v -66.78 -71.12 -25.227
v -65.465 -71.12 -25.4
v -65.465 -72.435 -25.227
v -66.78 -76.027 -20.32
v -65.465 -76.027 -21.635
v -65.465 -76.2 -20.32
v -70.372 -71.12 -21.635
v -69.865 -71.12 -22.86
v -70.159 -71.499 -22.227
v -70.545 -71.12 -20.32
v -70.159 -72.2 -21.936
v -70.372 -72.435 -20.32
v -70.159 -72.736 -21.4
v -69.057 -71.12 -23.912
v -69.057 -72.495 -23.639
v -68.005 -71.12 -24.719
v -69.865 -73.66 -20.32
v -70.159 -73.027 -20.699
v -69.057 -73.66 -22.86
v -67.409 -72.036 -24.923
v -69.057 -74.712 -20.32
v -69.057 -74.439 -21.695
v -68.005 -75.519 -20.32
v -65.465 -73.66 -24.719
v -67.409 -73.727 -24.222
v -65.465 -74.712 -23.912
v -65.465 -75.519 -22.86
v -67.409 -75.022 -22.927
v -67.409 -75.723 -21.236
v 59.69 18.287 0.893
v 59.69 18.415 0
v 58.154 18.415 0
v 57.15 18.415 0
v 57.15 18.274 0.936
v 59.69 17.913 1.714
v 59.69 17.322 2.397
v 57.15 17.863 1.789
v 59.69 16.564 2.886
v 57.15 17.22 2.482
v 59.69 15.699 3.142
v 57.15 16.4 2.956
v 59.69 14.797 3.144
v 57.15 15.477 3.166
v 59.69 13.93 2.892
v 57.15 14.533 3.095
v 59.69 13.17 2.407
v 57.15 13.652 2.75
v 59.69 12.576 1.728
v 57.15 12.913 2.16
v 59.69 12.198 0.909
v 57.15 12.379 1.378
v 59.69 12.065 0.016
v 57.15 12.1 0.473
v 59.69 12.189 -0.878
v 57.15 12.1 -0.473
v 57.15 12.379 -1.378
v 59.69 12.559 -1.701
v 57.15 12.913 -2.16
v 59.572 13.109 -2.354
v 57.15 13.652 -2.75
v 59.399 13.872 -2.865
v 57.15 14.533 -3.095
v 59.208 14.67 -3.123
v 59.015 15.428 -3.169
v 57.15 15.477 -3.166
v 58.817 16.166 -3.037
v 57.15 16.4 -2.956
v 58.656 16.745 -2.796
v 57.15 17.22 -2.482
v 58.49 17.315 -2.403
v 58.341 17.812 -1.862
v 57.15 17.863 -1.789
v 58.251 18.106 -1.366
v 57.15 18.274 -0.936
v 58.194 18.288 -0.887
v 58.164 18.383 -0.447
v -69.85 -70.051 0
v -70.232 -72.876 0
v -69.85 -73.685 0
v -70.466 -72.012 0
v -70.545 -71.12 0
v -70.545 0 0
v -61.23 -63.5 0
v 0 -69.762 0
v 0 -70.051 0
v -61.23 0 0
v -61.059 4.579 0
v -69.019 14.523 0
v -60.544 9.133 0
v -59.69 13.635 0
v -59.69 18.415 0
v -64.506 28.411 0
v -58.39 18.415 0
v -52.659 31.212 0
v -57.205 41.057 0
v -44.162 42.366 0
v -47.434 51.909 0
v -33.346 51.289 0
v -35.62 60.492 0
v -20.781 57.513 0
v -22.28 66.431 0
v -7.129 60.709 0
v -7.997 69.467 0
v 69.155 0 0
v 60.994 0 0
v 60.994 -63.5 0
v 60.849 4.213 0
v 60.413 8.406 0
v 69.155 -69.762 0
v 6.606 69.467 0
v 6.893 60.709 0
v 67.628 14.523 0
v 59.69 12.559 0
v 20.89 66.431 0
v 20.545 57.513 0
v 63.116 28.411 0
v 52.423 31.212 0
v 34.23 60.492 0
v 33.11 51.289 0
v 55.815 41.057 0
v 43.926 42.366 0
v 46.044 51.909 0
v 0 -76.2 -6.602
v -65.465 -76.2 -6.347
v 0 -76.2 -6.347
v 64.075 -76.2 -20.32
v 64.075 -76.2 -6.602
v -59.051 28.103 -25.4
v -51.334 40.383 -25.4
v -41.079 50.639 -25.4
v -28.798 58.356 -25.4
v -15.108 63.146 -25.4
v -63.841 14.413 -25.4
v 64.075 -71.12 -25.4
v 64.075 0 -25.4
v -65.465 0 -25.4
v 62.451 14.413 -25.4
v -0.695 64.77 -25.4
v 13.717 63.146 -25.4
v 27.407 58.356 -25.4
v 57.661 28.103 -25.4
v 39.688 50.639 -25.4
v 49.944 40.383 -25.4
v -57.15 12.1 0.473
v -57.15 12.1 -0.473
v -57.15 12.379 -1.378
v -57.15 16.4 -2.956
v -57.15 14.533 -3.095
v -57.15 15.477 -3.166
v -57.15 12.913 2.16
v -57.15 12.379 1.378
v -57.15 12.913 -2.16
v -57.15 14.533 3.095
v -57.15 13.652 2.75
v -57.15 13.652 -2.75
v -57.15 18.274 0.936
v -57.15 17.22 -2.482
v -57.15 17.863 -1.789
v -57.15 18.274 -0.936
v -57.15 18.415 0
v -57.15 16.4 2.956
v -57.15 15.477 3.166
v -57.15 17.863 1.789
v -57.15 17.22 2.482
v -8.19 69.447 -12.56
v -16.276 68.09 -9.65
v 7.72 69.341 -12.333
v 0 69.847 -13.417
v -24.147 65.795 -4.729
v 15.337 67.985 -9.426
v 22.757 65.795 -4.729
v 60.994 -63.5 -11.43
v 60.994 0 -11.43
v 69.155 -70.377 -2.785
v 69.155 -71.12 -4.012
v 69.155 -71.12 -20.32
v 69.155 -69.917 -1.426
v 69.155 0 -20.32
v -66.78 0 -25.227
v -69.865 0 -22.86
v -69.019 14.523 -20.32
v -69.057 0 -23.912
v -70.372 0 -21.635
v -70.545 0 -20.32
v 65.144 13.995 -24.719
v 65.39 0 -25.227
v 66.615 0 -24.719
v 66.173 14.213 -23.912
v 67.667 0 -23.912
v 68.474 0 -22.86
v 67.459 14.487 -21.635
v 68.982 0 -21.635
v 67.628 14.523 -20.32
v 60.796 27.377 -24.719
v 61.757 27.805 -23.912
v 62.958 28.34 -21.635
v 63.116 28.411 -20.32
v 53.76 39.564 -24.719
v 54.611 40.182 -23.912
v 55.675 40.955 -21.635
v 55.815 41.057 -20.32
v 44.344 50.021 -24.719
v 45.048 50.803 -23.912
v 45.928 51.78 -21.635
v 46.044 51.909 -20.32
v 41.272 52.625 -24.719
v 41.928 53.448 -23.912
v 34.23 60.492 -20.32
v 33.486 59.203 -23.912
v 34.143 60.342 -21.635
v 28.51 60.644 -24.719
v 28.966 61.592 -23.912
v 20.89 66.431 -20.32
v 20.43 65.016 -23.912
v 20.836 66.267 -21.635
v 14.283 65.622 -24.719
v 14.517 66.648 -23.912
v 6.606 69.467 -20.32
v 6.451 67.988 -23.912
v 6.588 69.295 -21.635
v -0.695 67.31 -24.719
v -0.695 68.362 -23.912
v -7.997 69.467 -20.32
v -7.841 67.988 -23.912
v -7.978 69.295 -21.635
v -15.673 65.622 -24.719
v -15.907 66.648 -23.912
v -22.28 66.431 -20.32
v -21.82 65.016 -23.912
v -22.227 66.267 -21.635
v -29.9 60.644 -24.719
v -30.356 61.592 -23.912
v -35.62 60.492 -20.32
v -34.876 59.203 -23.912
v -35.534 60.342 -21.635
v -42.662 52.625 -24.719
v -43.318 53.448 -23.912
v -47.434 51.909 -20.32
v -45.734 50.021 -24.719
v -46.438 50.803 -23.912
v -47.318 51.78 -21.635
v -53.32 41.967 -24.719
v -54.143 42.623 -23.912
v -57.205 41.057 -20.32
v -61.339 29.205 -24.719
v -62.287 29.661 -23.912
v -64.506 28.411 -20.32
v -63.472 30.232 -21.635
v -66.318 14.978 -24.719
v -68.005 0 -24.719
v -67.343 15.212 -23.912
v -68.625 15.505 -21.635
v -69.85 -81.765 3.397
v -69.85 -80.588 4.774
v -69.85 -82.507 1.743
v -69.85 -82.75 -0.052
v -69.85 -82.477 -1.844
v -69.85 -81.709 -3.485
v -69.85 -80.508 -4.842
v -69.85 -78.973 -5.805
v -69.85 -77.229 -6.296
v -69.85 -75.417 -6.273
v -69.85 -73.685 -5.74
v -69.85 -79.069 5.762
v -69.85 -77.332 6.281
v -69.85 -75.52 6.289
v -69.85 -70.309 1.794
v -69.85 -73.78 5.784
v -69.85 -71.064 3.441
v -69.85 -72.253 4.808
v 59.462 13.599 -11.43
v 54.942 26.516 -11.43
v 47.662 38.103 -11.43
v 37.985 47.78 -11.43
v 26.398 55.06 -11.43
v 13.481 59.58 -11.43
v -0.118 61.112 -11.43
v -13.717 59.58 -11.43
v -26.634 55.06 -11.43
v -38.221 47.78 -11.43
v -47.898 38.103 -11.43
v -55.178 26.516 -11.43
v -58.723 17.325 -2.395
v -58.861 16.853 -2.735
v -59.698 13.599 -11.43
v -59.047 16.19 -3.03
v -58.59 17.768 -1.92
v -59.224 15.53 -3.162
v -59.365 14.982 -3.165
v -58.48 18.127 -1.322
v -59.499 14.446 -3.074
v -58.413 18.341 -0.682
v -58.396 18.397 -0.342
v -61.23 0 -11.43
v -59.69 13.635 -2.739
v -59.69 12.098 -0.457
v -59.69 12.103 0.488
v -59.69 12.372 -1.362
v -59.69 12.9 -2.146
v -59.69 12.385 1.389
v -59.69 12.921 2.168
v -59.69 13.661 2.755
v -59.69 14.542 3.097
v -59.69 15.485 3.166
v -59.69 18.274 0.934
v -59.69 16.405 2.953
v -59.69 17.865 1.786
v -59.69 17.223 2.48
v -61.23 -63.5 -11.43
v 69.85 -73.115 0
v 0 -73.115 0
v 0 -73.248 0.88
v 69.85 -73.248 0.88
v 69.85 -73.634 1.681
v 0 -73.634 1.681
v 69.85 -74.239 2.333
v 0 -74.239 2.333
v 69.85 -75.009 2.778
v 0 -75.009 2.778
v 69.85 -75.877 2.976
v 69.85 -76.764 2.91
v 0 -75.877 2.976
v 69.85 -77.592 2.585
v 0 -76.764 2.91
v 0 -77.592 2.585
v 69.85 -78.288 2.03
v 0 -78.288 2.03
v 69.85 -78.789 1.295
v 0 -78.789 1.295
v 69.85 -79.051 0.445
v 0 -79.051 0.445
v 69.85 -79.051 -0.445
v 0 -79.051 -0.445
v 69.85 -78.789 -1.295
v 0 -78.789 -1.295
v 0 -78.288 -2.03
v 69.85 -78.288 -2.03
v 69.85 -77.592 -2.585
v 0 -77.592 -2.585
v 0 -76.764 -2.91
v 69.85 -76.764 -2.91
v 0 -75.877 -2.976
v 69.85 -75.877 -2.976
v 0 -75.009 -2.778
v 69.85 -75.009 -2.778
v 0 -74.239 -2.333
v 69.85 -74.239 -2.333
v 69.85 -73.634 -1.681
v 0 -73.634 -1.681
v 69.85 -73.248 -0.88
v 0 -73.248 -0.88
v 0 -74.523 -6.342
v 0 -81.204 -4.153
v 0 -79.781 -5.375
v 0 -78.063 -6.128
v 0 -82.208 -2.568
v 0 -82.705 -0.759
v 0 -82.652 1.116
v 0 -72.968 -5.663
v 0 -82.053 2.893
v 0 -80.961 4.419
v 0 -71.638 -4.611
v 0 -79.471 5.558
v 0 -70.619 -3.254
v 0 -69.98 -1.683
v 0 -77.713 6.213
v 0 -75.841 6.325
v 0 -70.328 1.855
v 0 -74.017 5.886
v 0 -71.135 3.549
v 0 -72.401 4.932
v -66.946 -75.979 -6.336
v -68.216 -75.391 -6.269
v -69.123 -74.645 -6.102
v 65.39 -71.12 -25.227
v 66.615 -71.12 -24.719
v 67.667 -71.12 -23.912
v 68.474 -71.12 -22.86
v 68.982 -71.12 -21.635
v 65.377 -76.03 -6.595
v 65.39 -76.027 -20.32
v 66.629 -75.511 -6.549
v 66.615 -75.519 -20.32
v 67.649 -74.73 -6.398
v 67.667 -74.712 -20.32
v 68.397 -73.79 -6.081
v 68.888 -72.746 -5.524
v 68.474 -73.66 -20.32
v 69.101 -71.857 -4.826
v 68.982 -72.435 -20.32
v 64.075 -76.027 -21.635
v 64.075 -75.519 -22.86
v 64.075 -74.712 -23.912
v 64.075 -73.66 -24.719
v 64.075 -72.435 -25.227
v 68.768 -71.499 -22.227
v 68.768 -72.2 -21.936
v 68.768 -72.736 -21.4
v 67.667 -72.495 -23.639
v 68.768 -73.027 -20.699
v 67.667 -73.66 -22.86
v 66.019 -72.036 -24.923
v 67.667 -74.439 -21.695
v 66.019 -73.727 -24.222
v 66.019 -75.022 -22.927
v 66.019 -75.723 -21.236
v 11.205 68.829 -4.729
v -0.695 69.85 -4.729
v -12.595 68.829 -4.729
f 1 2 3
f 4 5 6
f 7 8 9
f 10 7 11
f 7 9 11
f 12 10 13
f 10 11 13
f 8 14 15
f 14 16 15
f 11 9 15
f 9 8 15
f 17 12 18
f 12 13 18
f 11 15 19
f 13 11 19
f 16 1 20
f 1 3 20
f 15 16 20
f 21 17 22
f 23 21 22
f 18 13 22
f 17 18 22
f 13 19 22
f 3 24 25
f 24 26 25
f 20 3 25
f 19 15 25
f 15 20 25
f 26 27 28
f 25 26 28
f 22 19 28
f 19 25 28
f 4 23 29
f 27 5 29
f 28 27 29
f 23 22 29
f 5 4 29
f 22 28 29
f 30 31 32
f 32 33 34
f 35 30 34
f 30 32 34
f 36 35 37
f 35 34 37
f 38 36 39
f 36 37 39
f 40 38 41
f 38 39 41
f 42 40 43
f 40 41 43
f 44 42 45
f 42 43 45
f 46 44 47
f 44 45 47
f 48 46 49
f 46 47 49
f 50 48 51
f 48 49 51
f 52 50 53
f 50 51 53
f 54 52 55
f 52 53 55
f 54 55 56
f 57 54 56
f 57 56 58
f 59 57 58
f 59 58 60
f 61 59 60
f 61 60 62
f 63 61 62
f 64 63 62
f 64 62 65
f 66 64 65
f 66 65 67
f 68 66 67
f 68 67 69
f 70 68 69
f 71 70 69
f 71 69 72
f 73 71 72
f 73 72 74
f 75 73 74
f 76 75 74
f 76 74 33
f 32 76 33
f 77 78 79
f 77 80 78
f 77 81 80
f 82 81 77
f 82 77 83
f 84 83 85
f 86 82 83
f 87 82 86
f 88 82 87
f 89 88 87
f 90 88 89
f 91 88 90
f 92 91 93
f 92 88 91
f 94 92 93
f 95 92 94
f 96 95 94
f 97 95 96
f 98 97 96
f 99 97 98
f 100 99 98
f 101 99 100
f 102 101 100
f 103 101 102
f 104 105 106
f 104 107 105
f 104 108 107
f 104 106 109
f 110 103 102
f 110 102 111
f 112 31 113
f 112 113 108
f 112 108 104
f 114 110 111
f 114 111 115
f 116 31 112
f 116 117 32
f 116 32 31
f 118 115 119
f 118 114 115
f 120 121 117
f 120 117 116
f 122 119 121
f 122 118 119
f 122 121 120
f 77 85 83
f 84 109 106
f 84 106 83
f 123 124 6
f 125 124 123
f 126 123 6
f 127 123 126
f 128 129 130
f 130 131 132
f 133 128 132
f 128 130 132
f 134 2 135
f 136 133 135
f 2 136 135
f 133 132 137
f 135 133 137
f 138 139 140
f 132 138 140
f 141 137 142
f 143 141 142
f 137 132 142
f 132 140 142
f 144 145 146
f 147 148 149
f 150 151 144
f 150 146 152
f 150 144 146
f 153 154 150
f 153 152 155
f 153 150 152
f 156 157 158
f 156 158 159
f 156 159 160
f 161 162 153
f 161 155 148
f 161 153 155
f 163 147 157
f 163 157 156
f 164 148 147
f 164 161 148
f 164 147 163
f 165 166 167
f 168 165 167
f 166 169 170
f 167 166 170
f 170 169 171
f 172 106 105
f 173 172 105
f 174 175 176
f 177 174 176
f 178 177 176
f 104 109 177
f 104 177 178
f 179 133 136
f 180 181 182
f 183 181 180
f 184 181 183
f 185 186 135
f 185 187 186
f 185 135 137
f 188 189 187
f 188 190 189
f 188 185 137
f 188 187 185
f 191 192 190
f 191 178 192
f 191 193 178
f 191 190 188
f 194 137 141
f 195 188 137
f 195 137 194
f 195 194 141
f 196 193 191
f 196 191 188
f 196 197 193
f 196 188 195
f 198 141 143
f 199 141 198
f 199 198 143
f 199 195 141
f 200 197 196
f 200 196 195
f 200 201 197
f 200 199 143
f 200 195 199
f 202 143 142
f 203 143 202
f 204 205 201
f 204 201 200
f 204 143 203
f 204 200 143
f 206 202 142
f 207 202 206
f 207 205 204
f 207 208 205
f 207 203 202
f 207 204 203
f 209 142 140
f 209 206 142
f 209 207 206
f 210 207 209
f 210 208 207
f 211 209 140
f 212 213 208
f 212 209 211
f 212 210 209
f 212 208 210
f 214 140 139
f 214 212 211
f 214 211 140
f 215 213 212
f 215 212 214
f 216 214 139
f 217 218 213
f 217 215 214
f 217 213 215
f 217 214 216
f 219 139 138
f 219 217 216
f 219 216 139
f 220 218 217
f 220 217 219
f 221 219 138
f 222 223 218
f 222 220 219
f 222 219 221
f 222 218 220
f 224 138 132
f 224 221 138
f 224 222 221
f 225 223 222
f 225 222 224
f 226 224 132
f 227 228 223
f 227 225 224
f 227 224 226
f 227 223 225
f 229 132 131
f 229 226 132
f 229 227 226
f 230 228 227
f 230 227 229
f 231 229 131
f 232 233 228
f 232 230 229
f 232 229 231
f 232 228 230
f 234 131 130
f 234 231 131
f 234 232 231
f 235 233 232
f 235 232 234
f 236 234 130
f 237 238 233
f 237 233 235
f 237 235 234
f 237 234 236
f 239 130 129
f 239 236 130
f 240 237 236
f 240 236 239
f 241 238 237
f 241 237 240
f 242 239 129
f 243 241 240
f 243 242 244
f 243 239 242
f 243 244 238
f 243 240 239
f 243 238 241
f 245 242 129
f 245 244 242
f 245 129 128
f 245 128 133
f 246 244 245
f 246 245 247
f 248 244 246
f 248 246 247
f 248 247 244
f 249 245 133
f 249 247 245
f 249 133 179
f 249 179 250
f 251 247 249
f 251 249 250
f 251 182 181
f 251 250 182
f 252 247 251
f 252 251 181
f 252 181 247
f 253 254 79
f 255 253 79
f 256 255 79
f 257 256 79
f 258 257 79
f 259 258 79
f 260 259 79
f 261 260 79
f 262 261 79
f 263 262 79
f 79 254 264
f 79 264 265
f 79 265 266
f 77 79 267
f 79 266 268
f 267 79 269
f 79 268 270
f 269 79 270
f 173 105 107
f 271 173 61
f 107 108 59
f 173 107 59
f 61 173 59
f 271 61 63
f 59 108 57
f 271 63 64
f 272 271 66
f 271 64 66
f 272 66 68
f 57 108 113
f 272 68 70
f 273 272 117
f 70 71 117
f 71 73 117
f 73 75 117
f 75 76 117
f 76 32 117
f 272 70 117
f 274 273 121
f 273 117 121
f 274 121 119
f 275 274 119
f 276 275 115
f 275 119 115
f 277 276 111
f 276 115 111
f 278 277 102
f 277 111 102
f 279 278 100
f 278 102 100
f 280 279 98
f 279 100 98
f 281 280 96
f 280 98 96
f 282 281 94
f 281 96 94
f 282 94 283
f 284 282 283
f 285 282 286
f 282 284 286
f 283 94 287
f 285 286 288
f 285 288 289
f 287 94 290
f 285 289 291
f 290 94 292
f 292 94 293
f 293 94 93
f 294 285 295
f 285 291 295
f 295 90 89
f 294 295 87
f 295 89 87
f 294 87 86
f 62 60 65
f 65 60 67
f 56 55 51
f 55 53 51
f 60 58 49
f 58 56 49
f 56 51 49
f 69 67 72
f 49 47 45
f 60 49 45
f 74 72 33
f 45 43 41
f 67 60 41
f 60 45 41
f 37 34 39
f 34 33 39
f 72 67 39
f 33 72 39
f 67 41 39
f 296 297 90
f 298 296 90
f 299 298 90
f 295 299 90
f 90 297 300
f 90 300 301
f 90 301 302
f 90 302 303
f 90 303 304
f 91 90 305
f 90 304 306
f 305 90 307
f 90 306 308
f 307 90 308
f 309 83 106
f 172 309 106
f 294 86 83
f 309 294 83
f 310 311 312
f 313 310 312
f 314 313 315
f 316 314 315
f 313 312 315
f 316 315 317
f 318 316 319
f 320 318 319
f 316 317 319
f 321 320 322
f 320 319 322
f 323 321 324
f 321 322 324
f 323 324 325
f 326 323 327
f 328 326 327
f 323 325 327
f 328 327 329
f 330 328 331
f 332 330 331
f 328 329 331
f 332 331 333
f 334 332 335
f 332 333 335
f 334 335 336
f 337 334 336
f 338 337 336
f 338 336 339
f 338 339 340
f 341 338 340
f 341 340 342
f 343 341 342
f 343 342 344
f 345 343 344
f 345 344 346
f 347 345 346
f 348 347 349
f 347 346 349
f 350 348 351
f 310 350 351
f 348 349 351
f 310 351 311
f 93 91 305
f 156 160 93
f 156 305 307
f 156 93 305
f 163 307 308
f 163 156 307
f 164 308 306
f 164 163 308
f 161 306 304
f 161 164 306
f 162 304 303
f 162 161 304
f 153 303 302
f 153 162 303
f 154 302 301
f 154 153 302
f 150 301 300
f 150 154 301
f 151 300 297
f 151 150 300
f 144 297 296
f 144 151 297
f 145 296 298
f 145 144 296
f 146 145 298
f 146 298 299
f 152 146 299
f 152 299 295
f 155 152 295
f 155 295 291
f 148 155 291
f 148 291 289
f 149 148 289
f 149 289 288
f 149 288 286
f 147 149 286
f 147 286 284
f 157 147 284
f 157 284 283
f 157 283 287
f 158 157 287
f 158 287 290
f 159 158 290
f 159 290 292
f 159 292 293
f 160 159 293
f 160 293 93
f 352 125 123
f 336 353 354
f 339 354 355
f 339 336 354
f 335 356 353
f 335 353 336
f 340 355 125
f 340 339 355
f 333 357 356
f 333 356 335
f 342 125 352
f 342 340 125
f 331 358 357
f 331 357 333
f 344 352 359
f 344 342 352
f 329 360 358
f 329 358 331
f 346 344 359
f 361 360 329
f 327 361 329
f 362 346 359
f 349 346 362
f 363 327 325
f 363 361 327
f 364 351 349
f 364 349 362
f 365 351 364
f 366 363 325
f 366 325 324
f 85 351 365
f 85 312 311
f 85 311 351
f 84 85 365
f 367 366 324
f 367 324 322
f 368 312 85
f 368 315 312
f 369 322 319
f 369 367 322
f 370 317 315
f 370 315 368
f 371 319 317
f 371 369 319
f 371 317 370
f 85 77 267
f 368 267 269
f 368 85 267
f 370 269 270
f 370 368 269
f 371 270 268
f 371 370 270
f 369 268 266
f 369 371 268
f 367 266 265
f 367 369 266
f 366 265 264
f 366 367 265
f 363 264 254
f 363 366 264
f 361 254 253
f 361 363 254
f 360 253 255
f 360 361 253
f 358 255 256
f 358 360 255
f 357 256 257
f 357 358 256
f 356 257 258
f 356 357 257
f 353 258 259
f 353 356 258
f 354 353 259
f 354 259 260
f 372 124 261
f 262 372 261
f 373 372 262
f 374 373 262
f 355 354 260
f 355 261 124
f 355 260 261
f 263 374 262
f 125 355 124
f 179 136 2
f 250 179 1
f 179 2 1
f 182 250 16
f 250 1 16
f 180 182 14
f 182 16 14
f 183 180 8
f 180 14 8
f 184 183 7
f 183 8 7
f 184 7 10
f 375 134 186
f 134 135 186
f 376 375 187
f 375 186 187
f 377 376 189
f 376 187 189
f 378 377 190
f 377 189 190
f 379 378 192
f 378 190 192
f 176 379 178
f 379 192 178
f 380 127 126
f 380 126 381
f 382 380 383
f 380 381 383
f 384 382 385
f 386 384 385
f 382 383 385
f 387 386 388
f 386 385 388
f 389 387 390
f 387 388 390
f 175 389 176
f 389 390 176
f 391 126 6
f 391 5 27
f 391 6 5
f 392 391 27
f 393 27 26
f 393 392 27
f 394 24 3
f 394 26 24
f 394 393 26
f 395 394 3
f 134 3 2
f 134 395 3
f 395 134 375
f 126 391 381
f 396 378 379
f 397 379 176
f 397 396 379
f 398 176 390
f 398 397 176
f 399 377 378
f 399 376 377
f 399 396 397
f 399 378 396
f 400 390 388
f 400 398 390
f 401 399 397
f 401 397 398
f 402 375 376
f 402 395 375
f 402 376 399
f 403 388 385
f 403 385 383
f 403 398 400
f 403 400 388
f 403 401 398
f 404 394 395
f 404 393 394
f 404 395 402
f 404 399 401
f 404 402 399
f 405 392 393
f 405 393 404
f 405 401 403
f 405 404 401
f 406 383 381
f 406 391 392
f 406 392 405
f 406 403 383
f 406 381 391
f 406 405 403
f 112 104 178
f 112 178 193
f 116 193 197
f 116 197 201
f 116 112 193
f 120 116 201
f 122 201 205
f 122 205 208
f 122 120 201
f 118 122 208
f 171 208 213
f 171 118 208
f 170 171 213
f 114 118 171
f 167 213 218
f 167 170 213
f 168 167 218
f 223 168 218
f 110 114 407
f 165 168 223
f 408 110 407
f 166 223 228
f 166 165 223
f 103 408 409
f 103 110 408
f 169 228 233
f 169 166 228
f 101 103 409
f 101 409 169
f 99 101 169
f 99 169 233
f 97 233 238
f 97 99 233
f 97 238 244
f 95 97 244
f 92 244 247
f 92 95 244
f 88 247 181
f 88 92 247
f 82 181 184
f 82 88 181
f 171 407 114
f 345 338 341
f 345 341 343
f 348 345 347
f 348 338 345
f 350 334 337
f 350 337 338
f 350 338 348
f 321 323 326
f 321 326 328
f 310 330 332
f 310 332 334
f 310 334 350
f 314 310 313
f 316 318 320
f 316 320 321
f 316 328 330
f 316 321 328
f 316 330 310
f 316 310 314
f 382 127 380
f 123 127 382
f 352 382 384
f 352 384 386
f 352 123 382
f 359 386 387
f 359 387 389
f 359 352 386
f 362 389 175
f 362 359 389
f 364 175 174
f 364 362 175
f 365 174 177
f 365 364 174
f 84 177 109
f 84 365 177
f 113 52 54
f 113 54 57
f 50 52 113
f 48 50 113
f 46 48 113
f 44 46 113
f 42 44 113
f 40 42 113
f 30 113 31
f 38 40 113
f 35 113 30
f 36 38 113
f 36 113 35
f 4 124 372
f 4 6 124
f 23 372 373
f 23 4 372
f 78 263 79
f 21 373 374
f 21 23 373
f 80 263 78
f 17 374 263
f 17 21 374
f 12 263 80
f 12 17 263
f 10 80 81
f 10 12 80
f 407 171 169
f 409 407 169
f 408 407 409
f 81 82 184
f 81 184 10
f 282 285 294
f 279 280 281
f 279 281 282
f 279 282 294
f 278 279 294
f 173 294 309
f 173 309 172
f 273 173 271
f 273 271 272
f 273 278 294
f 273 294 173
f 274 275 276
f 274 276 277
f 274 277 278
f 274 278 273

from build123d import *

# Parameters (mm, degrees)
F4_DEPTH       = 25.4
F1_R           = 6.35
F5_DEPTH       = 69.85
F3_R           = 6.604
F6_DEPTH       = 69.85
F7_R           = 5.07999
F2_R           = 2.9845
F8_DEPTH       = 69.85
F10_DEPTH      = 11.43
F12_DEPTH      = 25.4
F12_DEPTH_BACK = 25.4
F13_R          = 3.175
F14_DEPTH      = 59.69
F14_DEPTH_BACK = 59.69
F15_R          = 3.1877
F16_DEPTH      = 57.15
F16_DEPTH_BACK = 57.15


# Not quite as in the source:
# - a fillet or chamfer is up to 0.001 mm smaller than in the source, because OpenCascade refuses the exact size


with BuildPart() as f4:
    # F0 (on Top) → F4 (new body)
    with BuildSketch(Plane.XY):
        with BuildLine():
            Line((69.1548068551, -76.2), (69.1548068551, 0))
            ThreePointArc((69.1548068551, 0), (-0.6951931449, 69.85), (-70.5451931449, 0))
            Line((-70.5451931449, 0), (-70.5451931449, -76.2))
            Line((-70.5451931449, -76.2), (69.1548068551, -76.2))
        make_face()
    extrude(amount=-F4_DEPTH)

    # F1 (on Right) → F5 (join)
    with BuildSketch(Plane.YZ):
        with Locations((-76.4005258679, 0)):
            Circle(F1_R)
    extrude(amount=-F5_DEPTH)

    # F3 (on Right) → F6 (cut)
    with BuildSketch(Plane.YZ):
        with Locations((-76.365634799, 0)):
            Circle(F3_R)
    extrude(amount=F6_DEPTH, mode=Mode.SUBTRACT)

    # F7 (radius 5.08 in the source; OpenCascade refuses exactly that, so slightly less here)
    f7_edges = [f4.edges().sort_by_distance(p)[0] for p in [
        (-0.695193, -76.2, -25.4),
        (-70.545193, -38.1, -25.4),
        (-70.545193, -76.2, -12.7),
        (69.154807, -76.2, -16.000961),
    ]]
    fillet(f7_edges, radius=F7_R)

    # F2 (on Right) → F8 (join)
    with BuildSketch(Plane.YZ):
        with Locations((-76.0997384787, 0)):
            Circle(F2_R)
    extrude(amount=F8_DEPTH)

    # F9 (on Top) → F10 (cut)
    with BuildSketch(Plane.XY):
        with BuildLine():
            Line((60.994354069, -63.5), (60.994354069, 0))
            ThreePointArc((60.994354069, 0), (-0.118045931, 61.1124), (-61.230445931, 0))
            Line((-61.230445931, 0), (-61.230445931, -63.5))
            Line((-61.230445931, -63.5), (60.994354069, -63.5))
        make_face()
    extrude(amount=-F10_DEPTH, mode=Mode.SUBTRACT)

    # F11 (on Right) → F12 (cut, two sides)
    with BuildSketch(Plane.YZ) as f12_sk:
        Polygon((71.3768934982, -16.6989553797), (69.8592278852, 0), (69.8592278852, -4.7290348448), (65.7952278852, -4.7290348448), align=None)
    extrude(amount=-F12_DEPTH, mode=Mode.SUBTRACT)
    extrude(f12_sk.sketch, amount=F12_DEPTH_BACK, mode=Mode.SUBTRACT)

    # F13 (on Right) → F14 (join, two sides)
    with BuildSketch(Plane.YZ) as f14_sk:
        with Locations((15.24, 0)):
            Circle(F13_R)
    extrude(amount=F14_DEPTH)
    extrude(f14_sk.sketch, amount=-F14_DEPTH_BACK)

    # F15 (on Right) → F16 (cut, two sides)
    with BuildSketch(Plane.YZ) as f16_sk:
        with Locations((15.24, 0)):
            Circle(F15_R)
    extrude(amount=-F16_DEPTH, mode=Mode.SUBTRACT)
    extrude(f16_sk.sketch, amount=F16_DEPTH_BACK, mode=Mode.SUBTRACT)


solid = f4.part
